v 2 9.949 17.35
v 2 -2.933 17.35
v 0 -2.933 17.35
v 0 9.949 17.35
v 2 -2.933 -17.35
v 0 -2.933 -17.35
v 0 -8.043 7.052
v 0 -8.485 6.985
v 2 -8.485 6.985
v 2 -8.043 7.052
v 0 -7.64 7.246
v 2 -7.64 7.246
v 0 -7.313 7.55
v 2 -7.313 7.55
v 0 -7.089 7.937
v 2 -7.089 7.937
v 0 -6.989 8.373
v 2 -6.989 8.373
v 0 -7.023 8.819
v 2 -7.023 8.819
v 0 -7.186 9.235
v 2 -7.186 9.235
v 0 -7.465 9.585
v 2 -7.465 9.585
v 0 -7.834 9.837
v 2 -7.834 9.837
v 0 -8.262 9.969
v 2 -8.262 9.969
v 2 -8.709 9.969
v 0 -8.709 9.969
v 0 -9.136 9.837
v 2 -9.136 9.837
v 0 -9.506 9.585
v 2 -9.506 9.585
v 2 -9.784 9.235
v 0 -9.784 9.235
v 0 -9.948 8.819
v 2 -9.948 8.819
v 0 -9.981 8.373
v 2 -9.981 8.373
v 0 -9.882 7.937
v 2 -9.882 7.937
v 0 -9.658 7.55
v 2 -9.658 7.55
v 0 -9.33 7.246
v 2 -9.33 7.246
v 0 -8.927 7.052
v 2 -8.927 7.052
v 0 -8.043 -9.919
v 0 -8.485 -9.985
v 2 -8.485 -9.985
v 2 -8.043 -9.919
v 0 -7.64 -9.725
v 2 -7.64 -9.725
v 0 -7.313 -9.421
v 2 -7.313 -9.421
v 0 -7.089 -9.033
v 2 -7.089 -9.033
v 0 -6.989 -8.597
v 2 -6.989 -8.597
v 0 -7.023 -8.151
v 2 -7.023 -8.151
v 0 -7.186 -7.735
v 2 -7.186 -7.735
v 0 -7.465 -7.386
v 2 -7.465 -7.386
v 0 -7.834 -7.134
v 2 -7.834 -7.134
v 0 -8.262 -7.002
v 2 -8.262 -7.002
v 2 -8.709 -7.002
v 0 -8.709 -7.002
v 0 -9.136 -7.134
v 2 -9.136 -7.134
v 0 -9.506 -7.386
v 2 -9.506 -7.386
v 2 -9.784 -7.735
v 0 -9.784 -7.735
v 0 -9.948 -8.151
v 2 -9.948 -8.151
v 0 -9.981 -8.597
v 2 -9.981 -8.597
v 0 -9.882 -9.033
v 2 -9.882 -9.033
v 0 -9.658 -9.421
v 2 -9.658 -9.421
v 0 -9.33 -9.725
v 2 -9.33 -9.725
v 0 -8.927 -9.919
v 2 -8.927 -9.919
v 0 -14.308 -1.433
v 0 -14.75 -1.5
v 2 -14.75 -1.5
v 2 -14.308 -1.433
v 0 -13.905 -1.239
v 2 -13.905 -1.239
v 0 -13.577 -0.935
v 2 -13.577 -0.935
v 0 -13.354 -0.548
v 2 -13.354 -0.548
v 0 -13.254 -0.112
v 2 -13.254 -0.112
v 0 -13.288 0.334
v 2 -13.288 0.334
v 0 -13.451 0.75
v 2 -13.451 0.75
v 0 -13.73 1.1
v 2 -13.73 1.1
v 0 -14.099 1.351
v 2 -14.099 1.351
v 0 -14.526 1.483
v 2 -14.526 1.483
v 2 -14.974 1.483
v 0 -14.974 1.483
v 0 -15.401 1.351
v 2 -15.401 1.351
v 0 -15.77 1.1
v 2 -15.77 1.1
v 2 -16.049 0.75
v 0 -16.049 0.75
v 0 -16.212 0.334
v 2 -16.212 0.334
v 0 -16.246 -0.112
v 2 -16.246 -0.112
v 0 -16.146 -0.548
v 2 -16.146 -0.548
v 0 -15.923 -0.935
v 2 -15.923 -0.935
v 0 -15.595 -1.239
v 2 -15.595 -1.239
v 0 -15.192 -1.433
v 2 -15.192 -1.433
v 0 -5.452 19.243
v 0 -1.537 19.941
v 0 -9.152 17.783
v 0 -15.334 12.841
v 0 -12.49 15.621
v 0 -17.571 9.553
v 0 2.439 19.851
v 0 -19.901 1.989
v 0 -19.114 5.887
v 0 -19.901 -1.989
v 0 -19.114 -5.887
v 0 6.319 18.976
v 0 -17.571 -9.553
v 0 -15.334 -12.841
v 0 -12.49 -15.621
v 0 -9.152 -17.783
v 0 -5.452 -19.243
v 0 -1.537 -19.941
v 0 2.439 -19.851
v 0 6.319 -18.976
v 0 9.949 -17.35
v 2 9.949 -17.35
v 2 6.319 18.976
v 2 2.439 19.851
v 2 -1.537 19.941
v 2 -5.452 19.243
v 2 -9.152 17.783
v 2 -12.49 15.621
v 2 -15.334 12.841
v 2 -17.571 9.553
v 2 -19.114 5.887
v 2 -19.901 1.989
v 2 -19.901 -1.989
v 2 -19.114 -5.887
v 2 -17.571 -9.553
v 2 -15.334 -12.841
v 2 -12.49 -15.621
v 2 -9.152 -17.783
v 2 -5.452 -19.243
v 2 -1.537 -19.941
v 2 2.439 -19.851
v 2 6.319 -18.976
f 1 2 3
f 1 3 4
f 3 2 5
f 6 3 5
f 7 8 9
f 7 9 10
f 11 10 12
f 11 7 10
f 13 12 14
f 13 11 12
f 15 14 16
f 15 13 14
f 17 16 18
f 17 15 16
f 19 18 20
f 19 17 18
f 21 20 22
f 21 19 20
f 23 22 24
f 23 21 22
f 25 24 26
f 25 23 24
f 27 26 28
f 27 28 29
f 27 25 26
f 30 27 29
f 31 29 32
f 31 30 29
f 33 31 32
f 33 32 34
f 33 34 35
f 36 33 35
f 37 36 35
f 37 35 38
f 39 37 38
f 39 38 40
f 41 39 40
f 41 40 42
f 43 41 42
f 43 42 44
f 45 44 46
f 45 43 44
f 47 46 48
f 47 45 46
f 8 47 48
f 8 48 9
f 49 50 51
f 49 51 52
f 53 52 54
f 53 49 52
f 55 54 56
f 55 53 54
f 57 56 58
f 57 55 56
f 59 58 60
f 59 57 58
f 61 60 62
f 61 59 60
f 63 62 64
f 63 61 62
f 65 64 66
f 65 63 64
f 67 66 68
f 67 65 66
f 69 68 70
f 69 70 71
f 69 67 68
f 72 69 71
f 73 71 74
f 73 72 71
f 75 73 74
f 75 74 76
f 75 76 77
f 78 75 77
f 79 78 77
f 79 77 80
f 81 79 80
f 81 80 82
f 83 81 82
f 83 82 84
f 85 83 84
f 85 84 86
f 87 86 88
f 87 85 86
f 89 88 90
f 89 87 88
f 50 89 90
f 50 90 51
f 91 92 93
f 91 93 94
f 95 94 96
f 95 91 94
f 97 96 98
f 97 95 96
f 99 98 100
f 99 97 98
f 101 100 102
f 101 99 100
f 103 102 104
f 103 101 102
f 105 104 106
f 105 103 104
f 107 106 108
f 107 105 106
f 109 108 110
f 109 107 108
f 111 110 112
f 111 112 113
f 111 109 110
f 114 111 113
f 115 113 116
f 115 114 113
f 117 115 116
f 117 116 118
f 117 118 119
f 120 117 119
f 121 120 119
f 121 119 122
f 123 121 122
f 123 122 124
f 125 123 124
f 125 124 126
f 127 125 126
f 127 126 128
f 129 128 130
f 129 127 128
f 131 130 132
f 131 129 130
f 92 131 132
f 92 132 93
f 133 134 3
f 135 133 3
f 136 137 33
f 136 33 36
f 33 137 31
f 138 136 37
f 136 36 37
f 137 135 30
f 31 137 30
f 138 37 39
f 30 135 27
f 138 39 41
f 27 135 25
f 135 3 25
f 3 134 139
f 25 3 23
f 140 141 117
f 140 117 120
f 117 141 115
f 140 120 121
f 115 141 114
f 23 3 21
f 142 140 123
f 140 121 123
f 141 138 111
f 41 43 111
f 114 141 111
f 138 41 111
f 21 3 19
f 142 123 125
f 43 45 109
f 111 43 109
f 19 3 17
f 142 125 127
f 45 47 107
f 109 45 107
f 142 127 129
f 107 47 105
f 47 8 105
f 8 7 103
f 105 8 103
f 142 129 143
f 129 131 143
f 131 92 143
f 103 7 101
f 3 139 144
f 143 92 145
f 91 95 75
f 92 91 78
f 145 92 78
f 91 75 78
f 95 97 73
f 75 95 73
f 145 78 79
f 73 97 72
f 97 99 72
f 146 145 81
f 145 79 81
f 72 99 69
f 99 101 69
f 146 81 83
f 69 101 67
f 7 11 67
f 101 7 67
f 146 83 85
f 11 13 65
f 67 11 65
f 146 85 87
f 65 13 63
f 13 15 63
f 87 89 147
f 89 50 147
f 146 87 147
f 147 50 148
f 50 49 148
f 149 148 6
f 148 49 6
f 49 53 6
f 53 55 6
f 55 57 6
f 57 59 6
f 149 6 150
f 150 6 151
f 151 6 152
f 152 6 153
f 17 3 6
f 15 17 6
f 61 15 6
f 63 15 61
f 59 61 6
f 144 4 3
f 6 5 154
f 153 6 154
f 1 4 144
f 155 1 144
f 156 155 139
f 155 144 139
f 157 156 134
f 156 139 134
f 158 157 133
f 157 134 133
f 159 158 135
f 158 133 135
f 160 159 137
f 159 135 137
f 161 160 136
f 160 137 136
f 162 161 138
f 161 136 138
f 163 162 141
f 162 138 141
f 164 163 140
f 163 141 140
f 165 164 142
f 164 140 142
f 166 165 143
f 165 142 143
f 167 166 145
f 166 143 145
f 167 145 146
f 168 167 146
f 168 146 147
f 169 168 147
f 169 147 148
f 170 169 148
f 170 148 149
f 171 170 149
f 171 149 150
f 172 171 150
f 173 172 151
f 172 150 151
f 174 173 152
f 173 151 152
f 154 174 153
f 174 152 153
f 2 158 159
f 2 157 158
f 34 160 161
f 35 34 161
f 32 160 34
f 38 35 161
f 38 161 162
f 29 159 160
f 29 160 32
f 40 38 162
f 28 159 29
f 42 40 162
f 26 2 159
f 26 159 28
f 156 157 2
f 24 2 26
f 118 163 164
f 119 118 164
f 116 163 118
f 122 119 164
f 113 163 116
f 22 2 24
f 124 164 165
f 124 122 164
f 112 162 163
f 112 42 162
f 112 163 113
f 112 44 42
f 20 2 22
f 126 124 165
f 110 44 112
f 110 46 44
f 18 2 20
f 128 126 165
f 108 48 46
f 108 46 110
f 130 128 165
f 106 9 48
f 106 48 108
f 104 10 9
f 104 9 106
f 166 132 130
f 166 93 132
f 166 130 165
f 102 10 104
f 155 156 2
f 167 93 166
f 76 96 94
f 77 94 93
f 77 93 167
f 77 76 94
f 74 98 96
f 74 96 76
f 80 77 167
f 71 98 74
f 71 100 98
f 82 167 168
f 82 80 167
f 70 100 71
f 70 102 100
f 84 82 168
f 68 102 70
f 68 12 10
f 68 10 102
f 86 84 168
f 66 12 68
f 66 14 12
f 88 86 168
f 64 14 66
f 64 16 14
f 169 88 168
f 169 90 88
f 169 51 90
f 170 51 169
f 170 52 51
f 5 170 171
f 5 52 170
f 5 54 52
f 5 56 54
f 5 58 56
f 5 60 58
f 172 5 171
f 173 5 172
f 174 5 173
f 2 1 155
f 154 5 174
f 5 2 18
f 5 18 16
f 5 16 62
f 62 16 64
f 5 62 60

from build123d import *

# Parameters (mm, degrees)
SKETCH1_R           = 20
SKETCH1_R_2         = 1.5
BOSS_EXTRUDE1_DEPTH = 2
SKETCH3_W           = 34.7
SKETCH3_H           = 20.283452378
CUT_EXTRUDE1_DEPTH  = 29.354893758


with BuildPart() as part:
    # Sketch1 → Boss-Extrude1 (new body)
    with BuildSketch(Plane(origin=(0, 0, 0), x_dir=(0, 0, -1), z_dir=(1, 0, 0))):
        Circle(SKETCH1_R)
        with Locations((0, 14.75)):
            Circle(SKETCH1_R_2, mode=Mode.SUBTRACT)
        with Locations((14.75, 0)):
            Circle(SKETCH1_R_2, mode=Mode.SUBTRACT)
        with Locations((0, -14.75)):
            Circle(SKETCH1_R_2, mode=Mode.SUBTRACT)
        with Locations((-14.75, 0)):
            Circle(SKETCH1_R_2, mode=Mode.SUBTRACT)
        with Locations((-8.485281374, 8.485281374)):
            Circle(SKETCH1_R_2, mode=Mode.SUBTRACT)
        with Locations((8.485281374, 8.485281374)):
            Circle(SKETCH1_R_2, mode=Mode.SUBTRACT)
        with Locations((8.485281374, -8.485281374)):
            Circle(SKETCH1_R_2, mode=Mode.SUBTRACT)
        with Locations((-8.485281374, -8.485281374)):
            Circle(SKETCH1_R_2, mode=Mode.SUBTRACT)
    extrude(amount=BOSS_EXTRUDE1_DEPTH)

    # Sketch3 → Cut-Extrude1 (cut, through all)
    with BuildSketch(Plane(origin=(2, 0, 0), x_dir=(0, 0, -1), z_dir=(1, 0, 0))):
        with Locations((0, 7.208273811)):
            Rectangle(SKETCH3_W, SKETCH3_H)
    extrude(amount=-CUT_EXTRUDE1_DEPTH, mode=Mode.SUBTRACT)


with BuildPart() as cut_extrude1_kept_piece:
    # of the separate pieces the step leaves, the one the design keeps (cut_extrude1_pieces_kept)
    add(part.part.solids().sort_by_distance((0, 9.948743639, 17.35))[0])


solid = cut_extrude1_kept_piece.part
